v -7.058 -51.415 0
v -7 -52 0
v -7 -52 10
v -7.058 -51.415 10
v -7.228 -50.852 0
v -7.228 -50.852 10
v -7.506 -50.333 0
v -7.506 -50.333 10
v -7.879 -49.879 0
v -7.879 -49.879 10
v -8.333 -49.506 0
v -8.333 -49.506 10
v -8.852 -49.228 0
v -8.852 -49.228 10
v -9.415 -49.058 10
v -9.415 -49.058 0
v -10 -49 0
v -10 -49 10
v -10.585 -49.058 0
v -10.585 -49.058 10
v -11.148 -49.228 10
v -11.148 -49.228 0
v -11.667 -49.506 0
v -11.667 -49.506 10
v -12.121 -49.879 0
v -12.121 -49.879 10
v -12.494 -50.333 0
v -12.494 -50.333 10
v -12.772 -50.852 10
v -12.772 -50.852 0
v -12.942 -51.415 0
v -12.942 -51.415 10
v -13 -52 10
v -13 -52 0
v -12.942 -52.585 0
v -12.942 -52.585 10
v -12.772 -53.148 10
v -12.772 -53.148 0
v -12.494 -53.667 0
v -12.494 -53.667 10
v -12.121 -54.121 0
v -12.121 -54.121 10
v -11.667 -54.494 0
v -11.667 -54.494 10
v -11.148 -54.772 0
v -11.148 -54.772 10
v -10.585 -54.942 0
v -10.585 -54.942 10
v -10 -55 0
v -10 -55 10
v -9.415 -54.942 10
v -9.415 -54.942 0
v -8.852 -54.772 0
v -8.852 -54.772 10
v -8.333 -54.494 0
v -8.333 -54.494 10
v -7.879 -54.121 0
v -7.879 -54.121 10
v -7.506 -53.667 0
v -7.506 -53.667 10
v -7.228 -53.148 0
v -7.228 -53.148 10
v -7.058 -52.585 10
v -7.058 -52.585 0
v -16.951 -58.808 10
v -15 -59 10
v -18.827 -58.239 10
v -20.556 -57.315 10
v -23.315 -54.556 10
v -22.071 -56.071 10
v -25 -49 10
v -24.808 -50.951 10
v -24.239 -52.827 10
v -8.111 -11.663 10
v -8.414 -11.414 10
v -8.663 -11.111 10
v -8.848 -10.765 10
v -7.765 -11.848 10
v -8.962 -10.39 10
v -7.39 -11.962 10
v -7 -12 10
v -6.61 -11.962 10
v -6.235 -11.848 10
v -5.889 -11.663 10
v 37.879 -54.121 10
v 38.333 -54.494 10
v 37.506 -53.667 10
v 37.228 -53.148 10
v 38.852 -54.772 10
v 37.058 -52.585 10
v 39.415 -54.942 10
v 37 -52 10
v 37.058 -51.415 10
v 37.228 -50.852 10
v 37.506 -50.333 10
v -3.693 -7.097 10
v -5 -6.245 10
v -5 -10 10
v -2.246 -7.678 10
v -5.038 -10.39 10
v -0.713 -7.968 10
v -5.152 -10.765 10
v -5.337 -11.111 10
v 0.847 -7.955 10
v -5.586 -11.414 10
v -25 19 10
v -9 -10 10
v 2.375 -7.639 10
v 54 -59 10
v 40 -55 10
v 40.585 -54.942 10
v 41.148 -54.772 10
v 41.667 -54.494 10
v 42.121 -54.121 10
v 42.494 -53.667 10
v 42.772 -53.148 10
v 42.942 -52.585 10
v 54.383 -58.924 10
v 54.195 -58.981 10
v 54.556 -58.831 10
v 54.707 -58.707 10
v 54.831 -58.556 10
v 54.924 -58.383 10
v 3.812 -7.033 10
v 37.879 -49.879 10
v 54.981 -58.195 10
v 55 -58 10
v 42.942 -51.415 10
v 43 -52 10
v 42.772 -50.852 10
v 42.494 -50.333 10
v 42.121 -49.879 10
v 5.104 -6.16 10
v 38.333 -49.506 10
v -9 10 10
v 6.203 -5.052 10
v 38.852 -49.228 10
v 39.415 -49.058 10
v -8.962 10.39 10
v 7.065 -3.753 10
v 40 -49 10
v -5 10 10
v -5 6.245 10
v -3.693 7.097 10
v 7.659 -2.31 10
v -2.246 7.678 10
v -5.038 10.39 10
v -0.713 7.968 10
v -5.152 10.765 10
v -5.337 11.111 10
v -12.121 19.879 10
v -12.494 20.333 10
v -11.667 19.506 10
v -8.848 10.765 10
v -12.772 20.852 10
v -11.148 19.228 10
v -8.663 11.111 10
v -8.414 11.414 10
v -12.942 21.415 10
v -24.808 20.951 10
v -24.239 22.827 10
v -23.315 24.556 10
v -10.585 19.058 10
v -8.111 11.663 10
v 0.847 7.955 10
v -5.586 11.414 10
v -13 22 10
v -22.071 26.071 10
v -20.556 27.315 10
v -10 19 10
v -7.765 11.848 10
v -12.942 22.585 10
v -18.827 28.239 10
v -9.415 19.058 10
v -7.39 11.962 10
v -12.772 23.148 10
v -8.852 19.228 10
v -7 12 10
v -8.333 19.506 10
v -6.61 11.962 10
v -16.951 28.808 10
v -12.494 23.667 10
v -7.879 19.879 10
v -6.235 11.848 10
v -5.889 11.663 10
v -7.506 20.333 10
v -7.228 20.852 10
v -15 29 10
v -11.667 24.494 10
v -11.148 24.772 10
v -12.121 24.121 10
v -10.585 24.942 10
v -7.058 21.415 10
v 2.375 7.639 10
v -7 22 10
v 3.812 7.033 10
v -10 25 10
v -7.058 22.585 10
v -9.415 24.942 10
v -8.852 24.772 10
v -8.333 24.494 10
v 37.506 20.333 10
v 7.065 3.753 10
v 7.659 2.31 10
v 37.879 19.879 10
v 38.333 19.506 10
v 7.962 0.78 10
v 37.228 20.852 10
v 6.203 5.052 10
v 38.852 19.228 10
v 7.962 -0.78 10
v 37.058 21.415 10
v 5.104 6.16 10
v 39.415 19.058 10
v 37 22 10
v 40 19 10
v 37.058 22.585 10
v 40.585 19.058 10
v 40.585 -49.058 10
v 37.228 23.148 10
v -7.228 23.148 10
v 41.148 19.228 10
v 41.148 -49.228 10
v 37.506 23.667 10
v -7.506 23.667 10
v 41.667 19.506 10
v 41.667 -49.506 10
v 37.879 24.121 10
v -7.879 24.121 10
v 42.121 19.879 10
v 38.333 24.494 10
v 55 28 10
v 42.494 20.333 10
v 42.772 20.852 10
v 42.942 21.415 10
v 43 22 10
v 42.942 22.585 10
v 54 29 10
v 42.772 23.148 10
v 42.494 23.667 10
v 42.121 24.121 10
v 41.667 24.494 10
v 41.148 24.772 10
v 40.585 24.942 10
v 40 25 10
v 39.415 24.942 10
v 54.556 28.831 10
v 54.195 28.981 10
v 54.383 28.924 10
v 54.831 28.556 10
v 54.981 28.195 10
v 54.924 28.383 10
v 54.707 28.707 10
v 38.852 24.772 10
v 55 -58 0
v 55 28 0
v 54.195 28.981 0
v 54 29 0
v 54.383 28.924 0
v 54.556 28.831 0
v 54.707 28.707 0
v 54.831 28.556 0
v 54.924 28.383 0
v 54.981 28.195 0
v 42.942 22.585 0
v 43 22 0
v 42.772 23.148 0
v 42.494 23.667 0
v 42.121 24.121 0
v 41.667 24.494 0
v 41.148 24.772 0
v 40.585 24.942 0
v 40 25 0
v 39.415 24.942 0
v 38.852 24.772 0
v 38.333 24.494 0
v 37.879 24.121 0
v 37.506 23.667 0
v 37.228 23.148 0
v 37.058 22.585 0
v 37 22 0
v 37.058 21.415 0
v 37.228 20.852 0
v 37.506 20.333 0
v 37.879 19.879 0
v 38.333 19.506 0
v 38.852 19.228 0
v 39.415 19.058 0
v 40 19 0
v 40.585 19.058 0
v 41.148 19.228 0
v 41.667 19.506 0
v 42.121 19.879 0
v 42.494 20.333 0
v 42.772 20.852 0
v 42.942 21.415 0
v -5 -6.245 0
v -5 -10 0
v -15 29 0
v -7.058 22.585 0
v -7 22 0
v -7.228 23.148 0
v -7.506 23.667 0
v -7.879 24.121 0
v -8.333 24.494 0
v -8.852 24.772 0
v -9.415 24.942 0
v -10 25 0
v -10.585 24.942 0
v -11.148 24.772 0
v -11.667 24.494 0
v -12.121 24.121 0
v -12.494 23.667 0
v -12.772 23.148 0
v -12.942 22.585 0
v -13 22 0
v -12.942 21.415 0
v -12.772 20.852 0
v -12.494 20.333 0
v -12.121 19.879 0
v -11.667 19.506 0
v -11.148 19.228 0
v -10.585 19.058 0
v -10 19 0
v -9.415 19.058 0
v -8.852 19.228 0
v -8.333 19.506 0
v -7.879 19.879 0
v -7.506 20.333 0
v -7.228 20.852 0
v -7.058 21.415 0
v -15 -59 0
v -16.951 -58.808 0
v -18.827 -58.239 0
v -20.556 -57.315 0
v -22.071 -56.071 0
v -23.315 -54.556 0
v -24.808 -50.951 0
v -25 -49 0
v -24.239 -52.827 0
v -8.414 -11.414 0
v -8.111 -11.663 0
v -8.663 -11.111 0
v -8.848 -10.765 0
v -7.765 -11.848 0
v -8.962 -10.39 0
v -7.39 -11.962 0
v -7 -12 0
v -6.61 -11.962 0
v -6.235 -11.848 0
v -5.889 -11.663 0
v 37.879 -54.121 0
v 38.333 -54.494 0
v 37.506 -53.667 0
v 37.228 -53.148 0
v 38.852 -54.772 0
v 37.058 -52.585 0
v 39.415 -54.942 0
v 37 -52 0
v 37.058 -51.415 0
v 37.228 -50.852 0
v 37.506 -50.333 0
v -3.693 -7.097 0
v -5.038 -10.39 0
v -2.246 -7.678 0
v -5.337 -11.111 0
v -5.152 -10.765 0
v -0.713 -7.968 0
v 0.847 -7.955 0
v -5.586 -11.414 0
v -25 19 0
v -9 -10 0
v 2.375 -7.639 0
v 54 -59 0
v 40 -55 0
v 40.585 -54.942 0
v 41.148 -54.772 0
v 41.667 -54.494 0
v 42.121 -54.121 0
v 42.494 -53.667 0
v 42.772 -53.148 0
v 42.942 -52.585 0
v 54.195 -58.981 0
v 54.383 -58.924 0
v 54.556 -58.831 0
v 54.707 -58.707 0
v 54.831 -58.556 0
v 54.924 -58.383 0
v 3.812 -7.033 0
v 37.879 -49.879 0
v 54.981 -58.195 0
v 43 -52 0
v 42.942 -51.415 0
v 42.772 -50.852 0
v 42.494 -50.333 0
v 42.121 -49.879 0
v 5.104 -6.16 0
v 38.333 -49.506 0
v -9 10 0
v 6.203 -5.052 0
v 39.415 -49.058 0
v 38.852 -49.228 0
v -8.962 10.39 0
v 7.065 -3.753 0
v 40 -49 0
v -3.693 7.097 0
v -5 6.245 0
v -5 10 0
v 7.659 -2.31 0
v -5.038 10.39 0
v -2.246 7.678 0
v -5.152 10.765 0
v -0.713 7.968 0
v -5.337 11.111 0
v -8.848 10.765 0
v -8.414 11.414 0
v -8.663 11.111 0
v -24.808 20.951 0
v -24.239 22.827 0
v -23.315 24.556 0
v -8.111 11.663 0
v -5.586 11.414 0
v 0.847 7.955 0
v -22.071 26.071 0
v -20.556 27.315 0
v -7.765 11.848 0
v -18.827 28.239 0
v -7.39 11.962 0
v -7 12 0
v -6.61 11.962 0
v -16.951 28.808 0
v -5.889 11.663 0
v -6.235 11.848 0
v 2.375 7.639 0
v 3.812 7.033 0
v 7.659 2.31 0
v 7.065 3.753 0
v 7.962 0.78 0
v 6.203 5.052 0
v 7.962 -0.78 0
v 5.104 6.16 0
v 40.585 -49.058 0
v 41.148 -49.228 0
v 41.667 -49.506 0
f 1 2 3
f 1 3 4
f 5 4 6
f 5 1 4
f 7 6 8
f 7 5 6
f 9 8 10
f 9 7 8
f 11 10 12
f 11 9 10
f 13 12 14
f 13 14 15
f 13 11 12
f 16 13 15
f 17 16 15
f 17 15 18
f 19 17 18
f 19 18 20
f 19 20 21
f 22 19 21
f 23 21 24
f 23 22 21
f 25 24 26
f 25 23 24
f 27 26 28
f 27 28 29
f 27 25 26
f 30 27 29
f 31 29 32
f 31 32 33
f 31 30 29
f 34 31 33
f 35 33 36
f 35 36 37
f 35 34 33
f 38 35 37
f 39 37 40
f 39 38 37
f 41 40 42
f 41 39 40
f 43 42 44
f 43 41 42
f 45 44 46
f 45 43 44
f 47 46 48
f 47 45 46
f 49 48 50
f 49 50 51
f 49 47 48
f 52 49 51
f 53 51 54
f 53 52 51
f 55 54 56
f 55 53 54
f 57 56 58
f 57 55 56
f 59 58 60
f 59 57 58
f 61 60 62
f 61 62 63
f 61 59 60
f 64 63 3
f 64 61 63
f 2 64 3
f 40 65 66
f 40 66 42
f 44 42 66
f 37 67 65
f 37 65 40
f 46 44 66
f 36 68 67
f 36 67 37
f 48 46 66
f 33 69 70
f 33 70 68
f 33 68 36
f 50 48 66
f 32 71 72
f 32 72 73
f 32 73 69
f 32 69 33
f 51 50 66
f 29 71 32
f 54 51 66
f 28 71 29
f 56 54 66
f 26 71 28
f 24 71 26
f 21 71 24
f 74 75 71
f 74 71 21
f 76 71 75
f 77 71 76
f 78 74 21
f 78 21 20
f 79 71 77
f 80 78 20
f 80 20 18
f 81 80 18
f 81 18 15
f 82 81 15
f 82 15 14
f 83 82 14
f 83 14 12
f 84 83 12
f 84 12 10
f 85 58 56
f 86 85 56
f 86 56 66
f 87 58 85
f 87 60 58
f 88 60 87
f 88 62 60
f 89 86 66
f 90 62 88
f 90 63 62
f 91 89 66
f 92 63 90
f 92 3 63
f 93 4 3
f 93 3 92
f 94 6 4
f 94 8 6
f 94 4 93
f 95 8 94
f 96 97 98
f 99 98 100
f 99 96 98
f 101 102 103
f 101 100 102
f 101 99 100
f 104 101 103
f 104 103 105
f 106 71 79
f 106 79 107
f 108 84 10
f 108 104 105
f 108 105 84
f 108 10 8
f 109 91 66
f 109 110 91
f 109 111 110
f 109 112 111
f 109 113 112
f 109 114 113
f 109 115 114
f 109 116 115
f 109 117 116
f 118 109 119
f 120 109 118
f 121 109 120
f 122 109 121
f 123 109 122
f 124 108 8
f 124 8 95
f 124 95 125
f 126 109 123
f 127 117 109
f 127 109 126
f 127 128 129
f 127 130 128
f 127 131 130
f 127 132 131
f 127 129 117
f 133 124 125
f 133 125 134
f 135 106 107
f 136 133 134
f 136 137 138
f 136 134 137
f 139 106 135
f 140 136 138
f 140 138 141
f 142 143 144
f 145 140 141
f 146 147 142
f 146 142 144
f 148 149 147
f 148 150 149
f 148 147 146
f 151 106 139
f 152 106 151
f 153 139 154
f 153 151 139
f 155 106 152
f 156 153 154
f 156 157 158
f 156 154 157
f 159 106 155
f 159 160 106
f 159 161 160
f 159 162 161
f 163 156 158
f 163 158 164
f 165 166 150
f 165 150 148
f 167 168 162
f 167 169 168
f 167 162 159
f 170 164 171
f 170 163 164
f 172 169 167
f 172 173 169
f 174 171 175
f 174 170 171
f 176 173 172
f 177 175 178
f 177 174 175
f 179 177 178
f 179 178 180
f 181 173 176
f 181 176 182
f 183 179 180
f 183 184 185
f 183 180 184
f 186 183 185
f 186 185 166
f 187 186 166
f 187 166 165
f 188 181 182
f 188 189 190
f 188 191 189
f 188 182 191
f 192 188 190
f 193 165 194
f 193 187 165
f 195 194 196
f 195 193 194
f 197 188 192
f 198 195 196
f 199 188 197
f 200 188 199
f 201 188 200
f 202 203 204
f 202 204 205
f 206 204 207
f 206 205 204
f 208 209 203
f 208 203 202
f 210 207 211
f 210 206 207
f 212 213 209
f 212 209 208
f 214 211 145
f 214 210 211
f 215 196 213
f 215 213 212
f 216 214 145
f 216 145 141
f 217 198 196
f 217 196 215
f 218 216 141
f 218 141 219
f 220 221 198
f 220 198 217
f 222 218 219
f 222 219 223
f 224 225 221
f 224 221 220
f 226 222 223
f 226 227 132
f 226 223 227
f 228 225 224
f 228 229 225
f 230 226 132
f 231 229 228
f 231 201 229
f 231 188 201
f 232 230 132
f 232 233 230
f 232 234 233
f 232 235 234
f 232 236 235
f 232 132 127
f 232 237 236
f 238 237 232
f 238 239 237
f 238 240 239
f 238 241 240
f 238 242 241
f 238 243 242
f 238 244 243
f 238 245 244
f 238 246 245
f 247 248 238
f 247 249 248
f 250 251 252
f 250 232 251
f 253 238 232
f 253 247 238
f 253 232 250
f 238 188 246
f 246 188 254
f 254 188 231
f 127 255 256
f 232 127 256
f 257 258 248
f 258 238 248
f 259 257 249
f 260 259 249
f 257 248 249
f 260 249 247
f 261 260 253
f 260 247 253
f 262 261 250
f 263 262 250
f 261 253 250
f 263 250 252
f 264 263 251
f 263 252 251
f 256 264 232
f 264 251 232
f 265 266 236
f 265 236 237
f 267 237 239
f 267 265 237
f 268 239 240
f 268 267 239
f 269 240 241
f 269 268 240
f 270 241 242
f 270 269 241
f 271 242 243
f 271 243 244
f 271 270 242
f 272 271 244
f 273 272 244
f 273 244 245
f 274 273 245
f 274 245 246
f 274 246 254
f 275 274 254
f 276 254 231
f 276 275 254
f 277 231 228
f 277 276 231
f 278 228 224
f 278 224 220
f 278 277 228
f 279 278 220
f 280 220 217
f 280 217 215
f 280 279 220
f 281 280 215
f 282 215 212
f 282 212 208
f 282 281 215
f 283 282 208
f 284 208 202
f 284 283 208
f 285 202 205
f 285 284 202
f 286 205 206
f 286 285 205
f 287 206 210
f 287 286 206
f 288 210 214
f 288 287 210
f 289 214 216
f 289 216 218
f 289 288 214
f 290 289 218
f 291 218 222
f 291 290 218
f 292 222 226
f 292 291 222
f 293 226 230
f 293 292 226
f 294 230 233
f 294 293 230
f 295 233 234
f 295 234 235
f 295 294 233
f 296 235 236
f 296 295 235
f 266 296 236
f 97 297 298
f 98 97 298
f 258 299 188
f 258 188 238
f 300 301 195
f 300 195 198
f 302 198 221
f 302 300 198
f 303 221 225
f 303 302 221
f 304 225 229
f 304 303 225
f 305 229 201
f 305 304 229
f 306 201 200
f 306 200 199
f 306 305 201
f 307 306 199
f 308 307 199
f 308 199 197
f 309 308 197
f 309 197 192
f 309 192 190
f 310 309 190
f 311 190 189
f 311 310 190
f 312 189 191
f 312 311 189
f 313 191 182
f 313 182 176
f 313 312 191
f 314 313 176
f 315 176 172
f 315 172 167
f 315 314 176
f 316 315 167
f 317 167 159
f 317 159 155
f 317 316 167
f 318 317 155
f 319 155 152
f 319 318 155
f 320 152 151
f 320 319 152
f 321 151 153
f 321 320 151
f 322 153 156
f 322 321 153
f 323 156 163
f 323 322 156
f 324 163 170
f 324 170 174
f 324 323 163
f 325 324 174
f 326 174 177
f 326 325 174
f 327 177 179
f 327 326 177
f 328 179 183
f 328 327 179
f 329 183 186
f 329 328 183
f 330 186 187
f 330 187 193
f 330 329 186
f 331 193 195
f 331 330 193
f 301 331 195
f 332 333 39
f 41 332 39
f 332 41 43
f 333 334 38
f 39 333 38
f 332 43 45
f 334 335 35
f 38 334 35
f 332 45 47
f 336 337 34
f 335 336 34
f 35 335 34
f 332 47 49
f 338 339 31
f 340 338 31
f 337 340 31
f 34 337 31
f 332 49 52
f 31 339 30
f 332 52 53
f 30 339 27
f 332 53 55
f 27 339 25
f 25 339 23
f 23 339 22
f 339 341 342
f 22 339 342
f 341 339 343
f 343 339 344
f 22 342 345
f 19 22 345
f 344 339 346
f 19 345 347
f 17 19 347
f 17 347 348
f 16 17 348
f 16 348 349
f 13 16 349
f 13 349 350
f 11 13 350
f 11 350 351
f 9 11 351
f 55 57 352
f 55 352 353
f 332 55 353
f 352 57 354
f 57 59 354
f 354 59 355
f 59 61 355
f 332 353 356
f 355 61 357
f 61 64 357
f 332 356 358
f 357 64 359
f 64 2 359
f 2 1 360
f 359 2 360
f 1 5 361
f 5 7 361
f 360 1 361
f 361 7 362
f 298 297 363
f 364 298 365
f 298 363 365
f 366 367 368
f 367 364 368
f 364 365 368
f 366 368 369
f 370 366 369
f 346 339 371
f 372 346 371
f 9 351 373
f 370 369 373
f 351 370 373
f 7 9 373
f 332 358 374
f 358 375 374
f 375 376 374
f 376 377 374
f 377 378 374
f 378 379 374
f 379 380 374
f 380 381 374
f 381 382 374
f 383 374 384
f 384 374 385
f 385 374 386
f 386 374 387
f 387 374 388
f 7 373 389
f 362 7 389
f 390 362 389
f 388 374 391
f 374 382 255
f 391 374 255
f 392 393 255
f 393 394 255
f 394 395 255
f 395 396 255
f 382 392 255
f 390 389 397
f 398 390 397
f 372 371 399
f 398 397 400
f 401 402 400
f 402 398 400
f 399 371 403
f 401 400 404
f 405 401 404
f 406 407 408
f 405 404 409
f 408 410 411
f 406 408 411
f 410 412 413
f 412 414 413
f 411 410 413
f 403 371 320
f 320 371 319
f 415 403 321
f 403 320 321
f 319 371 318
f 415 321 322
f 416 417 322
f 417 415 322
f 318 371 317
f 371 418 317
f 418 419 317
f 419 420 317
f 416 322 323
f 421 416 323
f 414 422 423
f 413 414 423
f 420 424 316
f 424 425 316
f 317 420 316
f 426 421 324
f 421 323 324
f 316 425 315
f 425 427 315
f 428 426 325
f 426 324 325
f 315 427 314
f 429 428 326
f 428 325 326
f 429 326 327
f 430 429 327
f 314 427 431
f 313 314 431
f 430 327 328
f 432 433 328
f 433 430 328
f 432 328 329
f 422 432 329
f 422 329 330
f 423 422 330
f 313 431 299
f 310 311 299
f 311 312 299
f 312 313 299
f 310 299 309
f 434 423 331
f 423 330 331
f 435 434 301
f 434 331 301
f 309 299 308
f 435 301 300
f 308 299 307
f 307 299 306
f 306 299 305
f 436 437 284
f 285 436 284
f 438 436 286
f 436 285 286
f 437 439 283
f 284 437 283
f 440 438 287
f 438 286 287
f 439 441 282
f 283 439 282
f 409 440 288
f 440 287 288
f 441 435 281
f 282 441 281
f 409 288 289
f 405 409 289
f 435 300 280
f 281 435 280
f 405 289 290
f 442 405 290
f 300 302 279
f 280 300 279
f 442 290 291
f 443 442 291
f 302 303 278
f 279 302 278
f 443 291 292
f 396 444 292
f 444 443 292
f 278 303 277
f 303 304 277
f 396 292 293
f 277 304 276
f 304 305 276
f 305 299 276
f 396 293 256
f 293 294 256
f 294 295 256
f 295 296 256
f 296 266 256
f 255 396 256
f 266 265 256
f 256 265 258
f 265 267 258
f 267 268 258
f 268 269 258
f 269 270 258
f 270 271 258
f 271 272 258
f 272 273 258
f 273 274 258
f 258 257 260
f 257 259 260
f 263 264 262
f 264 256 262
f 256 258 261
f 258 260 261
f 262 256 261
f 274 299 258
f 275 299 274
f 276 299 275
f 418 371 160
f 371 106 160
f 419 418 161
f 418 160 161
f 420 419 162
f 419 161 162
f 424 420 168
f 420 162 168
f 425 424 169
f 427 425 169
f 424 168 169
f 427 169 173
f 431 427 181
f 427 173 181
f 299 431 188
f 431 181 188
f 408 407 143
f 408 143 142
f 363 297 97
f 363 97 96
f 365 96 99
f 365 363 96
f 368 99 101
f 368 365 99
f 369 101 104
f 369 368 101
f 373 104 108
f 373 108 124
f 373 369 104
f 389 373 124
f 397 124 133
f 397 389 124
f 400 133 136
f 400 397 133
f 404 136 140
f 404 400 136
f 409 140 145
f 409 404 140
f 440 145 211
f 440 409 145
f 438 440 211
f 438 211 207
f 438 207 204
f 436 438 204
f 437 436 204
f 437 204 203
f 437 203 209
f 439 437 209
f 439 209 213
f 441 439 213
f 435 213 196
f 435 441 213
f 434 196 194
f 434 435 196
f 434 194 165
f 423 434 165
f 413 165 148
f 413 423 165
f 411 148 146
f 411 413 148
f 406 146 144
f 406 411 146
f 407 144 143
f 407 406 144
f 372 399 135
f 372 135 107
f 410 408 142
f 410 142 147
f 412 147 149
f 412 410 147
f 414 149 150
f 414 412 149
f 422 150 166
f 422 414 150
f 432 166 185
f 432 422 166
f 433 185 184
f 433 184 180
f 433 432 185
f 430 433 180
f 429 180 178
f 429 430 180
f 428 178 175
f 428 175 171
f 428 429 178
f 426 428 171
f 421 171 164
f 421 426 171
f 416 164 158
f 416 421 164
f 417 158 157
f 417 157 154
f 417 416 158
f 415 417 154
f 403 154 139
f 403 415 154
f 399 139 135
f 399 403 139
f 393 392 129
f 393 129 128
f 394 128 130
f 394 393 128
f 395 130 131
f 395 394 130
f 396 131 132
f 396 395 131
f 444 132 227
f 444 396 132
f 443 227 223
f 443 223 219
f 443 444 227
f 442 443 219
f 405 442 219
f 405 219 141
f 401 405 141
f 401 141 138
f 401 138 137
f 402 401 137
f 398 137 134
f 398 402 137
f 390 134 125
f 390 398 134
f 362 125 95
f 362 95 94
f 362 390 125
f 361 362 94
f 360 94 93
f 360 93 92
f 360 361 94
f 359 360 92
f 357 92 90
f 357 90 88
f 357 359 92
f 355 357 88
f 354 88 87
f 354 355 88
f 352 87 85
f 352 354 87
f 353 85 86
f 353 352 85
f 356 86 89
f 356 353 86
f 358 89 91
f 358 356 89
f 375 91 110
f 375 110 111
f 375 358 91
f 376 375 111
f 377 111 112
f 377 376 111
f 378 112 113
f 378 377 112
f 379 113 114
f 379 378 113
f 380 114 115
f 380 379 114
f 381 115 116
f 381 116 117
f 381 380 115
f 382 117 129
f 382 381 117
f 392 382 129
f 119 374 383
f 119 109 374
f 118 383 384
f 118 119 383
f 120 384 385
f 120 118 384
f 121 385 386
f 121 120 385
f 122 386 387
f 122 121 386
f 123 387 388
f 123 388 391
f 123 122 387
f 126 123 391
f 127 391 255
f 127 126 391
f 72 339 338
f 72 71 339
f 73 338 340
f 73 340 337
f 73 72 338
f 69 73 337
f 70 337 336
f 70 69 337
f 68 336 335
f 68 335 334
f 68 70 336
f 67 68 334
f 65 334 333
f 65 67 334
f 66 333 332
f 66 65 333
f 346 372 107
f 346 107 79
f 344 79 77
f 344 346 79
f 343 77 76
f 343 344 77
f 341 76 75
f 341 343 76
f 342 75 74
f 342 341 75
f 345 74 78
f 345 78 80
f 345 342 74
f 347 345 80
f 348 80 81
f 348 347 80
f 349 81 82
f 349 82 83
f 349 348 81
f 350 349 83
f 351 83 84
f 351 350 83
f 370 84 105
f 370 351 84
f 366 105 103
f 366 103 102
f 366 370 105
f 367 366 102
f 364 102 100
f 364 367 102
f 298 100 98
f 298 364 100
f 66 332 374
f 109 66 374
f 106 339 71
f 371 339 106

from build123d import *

# Parameters (mm, degrees)
SKETCH_W    = 80
SKETCH_H    = 88
SKETCH_R    = 3
PAD_DEPTH   = 10
FILLET_R    = 10
FILLET001_R = 1


with BuildPart() as part:
    # Sketch → Pad (new body)
    with BuildSketch(Plane.XY):
        with Locations((15, -15)):
            Rectangle(SKETCH_W, SKETCH_H)
        with Locations((-10, -52)):
            Circle(SKETCH_R, mode=Mode.SUBTRACT)
        with Locations((40, -52)):
            Circle(SKETCH_R, mode=Mode.SUBTRACT)
        with Locations((40, 22)):
            Circle(SKETCH_R, mode=Mode.SUBTRACT)
        with Locations((-10, 22)):
            Circle(SKETCH_R, mode=Mode.SUBTRACT)
        with BuildLine():
            ThreePointArc((-5, -6.244998), (8, 0), (-5, 6.244998))
            Line((-5, 6.244998), (-5, 10))
            ThreePointArc((-5, 10), (-7, 12), (-9, 10))
            Line((-9, 10), (-9, -10))
            ThreePointArc((-9, -10), (-7, -12), (-5, -10))
            Line((-5, -6.244998), (-5, -10))
        make_face(mode=Mode.SUBTRACT)
    extrude(amount=PAD_DEPTH)

    # Fillet
    fillet_edges = [part.edges().sort_by_distance(p)[0] for p in [
        (-25, -59, 5),
        (-25, 29, 5),
    ]]
    fillet(fillet_edges, radius=FILLET_R)

    # Fillet001
    fillet001_edges = [part.edges().sort_by_distance(p)[0] for p in [
        (55, -59, 5),
        (55, 29, 5),
    ]]
    fillet(fillet001_edges, radius=FILLET001_R)


solid = part.part
